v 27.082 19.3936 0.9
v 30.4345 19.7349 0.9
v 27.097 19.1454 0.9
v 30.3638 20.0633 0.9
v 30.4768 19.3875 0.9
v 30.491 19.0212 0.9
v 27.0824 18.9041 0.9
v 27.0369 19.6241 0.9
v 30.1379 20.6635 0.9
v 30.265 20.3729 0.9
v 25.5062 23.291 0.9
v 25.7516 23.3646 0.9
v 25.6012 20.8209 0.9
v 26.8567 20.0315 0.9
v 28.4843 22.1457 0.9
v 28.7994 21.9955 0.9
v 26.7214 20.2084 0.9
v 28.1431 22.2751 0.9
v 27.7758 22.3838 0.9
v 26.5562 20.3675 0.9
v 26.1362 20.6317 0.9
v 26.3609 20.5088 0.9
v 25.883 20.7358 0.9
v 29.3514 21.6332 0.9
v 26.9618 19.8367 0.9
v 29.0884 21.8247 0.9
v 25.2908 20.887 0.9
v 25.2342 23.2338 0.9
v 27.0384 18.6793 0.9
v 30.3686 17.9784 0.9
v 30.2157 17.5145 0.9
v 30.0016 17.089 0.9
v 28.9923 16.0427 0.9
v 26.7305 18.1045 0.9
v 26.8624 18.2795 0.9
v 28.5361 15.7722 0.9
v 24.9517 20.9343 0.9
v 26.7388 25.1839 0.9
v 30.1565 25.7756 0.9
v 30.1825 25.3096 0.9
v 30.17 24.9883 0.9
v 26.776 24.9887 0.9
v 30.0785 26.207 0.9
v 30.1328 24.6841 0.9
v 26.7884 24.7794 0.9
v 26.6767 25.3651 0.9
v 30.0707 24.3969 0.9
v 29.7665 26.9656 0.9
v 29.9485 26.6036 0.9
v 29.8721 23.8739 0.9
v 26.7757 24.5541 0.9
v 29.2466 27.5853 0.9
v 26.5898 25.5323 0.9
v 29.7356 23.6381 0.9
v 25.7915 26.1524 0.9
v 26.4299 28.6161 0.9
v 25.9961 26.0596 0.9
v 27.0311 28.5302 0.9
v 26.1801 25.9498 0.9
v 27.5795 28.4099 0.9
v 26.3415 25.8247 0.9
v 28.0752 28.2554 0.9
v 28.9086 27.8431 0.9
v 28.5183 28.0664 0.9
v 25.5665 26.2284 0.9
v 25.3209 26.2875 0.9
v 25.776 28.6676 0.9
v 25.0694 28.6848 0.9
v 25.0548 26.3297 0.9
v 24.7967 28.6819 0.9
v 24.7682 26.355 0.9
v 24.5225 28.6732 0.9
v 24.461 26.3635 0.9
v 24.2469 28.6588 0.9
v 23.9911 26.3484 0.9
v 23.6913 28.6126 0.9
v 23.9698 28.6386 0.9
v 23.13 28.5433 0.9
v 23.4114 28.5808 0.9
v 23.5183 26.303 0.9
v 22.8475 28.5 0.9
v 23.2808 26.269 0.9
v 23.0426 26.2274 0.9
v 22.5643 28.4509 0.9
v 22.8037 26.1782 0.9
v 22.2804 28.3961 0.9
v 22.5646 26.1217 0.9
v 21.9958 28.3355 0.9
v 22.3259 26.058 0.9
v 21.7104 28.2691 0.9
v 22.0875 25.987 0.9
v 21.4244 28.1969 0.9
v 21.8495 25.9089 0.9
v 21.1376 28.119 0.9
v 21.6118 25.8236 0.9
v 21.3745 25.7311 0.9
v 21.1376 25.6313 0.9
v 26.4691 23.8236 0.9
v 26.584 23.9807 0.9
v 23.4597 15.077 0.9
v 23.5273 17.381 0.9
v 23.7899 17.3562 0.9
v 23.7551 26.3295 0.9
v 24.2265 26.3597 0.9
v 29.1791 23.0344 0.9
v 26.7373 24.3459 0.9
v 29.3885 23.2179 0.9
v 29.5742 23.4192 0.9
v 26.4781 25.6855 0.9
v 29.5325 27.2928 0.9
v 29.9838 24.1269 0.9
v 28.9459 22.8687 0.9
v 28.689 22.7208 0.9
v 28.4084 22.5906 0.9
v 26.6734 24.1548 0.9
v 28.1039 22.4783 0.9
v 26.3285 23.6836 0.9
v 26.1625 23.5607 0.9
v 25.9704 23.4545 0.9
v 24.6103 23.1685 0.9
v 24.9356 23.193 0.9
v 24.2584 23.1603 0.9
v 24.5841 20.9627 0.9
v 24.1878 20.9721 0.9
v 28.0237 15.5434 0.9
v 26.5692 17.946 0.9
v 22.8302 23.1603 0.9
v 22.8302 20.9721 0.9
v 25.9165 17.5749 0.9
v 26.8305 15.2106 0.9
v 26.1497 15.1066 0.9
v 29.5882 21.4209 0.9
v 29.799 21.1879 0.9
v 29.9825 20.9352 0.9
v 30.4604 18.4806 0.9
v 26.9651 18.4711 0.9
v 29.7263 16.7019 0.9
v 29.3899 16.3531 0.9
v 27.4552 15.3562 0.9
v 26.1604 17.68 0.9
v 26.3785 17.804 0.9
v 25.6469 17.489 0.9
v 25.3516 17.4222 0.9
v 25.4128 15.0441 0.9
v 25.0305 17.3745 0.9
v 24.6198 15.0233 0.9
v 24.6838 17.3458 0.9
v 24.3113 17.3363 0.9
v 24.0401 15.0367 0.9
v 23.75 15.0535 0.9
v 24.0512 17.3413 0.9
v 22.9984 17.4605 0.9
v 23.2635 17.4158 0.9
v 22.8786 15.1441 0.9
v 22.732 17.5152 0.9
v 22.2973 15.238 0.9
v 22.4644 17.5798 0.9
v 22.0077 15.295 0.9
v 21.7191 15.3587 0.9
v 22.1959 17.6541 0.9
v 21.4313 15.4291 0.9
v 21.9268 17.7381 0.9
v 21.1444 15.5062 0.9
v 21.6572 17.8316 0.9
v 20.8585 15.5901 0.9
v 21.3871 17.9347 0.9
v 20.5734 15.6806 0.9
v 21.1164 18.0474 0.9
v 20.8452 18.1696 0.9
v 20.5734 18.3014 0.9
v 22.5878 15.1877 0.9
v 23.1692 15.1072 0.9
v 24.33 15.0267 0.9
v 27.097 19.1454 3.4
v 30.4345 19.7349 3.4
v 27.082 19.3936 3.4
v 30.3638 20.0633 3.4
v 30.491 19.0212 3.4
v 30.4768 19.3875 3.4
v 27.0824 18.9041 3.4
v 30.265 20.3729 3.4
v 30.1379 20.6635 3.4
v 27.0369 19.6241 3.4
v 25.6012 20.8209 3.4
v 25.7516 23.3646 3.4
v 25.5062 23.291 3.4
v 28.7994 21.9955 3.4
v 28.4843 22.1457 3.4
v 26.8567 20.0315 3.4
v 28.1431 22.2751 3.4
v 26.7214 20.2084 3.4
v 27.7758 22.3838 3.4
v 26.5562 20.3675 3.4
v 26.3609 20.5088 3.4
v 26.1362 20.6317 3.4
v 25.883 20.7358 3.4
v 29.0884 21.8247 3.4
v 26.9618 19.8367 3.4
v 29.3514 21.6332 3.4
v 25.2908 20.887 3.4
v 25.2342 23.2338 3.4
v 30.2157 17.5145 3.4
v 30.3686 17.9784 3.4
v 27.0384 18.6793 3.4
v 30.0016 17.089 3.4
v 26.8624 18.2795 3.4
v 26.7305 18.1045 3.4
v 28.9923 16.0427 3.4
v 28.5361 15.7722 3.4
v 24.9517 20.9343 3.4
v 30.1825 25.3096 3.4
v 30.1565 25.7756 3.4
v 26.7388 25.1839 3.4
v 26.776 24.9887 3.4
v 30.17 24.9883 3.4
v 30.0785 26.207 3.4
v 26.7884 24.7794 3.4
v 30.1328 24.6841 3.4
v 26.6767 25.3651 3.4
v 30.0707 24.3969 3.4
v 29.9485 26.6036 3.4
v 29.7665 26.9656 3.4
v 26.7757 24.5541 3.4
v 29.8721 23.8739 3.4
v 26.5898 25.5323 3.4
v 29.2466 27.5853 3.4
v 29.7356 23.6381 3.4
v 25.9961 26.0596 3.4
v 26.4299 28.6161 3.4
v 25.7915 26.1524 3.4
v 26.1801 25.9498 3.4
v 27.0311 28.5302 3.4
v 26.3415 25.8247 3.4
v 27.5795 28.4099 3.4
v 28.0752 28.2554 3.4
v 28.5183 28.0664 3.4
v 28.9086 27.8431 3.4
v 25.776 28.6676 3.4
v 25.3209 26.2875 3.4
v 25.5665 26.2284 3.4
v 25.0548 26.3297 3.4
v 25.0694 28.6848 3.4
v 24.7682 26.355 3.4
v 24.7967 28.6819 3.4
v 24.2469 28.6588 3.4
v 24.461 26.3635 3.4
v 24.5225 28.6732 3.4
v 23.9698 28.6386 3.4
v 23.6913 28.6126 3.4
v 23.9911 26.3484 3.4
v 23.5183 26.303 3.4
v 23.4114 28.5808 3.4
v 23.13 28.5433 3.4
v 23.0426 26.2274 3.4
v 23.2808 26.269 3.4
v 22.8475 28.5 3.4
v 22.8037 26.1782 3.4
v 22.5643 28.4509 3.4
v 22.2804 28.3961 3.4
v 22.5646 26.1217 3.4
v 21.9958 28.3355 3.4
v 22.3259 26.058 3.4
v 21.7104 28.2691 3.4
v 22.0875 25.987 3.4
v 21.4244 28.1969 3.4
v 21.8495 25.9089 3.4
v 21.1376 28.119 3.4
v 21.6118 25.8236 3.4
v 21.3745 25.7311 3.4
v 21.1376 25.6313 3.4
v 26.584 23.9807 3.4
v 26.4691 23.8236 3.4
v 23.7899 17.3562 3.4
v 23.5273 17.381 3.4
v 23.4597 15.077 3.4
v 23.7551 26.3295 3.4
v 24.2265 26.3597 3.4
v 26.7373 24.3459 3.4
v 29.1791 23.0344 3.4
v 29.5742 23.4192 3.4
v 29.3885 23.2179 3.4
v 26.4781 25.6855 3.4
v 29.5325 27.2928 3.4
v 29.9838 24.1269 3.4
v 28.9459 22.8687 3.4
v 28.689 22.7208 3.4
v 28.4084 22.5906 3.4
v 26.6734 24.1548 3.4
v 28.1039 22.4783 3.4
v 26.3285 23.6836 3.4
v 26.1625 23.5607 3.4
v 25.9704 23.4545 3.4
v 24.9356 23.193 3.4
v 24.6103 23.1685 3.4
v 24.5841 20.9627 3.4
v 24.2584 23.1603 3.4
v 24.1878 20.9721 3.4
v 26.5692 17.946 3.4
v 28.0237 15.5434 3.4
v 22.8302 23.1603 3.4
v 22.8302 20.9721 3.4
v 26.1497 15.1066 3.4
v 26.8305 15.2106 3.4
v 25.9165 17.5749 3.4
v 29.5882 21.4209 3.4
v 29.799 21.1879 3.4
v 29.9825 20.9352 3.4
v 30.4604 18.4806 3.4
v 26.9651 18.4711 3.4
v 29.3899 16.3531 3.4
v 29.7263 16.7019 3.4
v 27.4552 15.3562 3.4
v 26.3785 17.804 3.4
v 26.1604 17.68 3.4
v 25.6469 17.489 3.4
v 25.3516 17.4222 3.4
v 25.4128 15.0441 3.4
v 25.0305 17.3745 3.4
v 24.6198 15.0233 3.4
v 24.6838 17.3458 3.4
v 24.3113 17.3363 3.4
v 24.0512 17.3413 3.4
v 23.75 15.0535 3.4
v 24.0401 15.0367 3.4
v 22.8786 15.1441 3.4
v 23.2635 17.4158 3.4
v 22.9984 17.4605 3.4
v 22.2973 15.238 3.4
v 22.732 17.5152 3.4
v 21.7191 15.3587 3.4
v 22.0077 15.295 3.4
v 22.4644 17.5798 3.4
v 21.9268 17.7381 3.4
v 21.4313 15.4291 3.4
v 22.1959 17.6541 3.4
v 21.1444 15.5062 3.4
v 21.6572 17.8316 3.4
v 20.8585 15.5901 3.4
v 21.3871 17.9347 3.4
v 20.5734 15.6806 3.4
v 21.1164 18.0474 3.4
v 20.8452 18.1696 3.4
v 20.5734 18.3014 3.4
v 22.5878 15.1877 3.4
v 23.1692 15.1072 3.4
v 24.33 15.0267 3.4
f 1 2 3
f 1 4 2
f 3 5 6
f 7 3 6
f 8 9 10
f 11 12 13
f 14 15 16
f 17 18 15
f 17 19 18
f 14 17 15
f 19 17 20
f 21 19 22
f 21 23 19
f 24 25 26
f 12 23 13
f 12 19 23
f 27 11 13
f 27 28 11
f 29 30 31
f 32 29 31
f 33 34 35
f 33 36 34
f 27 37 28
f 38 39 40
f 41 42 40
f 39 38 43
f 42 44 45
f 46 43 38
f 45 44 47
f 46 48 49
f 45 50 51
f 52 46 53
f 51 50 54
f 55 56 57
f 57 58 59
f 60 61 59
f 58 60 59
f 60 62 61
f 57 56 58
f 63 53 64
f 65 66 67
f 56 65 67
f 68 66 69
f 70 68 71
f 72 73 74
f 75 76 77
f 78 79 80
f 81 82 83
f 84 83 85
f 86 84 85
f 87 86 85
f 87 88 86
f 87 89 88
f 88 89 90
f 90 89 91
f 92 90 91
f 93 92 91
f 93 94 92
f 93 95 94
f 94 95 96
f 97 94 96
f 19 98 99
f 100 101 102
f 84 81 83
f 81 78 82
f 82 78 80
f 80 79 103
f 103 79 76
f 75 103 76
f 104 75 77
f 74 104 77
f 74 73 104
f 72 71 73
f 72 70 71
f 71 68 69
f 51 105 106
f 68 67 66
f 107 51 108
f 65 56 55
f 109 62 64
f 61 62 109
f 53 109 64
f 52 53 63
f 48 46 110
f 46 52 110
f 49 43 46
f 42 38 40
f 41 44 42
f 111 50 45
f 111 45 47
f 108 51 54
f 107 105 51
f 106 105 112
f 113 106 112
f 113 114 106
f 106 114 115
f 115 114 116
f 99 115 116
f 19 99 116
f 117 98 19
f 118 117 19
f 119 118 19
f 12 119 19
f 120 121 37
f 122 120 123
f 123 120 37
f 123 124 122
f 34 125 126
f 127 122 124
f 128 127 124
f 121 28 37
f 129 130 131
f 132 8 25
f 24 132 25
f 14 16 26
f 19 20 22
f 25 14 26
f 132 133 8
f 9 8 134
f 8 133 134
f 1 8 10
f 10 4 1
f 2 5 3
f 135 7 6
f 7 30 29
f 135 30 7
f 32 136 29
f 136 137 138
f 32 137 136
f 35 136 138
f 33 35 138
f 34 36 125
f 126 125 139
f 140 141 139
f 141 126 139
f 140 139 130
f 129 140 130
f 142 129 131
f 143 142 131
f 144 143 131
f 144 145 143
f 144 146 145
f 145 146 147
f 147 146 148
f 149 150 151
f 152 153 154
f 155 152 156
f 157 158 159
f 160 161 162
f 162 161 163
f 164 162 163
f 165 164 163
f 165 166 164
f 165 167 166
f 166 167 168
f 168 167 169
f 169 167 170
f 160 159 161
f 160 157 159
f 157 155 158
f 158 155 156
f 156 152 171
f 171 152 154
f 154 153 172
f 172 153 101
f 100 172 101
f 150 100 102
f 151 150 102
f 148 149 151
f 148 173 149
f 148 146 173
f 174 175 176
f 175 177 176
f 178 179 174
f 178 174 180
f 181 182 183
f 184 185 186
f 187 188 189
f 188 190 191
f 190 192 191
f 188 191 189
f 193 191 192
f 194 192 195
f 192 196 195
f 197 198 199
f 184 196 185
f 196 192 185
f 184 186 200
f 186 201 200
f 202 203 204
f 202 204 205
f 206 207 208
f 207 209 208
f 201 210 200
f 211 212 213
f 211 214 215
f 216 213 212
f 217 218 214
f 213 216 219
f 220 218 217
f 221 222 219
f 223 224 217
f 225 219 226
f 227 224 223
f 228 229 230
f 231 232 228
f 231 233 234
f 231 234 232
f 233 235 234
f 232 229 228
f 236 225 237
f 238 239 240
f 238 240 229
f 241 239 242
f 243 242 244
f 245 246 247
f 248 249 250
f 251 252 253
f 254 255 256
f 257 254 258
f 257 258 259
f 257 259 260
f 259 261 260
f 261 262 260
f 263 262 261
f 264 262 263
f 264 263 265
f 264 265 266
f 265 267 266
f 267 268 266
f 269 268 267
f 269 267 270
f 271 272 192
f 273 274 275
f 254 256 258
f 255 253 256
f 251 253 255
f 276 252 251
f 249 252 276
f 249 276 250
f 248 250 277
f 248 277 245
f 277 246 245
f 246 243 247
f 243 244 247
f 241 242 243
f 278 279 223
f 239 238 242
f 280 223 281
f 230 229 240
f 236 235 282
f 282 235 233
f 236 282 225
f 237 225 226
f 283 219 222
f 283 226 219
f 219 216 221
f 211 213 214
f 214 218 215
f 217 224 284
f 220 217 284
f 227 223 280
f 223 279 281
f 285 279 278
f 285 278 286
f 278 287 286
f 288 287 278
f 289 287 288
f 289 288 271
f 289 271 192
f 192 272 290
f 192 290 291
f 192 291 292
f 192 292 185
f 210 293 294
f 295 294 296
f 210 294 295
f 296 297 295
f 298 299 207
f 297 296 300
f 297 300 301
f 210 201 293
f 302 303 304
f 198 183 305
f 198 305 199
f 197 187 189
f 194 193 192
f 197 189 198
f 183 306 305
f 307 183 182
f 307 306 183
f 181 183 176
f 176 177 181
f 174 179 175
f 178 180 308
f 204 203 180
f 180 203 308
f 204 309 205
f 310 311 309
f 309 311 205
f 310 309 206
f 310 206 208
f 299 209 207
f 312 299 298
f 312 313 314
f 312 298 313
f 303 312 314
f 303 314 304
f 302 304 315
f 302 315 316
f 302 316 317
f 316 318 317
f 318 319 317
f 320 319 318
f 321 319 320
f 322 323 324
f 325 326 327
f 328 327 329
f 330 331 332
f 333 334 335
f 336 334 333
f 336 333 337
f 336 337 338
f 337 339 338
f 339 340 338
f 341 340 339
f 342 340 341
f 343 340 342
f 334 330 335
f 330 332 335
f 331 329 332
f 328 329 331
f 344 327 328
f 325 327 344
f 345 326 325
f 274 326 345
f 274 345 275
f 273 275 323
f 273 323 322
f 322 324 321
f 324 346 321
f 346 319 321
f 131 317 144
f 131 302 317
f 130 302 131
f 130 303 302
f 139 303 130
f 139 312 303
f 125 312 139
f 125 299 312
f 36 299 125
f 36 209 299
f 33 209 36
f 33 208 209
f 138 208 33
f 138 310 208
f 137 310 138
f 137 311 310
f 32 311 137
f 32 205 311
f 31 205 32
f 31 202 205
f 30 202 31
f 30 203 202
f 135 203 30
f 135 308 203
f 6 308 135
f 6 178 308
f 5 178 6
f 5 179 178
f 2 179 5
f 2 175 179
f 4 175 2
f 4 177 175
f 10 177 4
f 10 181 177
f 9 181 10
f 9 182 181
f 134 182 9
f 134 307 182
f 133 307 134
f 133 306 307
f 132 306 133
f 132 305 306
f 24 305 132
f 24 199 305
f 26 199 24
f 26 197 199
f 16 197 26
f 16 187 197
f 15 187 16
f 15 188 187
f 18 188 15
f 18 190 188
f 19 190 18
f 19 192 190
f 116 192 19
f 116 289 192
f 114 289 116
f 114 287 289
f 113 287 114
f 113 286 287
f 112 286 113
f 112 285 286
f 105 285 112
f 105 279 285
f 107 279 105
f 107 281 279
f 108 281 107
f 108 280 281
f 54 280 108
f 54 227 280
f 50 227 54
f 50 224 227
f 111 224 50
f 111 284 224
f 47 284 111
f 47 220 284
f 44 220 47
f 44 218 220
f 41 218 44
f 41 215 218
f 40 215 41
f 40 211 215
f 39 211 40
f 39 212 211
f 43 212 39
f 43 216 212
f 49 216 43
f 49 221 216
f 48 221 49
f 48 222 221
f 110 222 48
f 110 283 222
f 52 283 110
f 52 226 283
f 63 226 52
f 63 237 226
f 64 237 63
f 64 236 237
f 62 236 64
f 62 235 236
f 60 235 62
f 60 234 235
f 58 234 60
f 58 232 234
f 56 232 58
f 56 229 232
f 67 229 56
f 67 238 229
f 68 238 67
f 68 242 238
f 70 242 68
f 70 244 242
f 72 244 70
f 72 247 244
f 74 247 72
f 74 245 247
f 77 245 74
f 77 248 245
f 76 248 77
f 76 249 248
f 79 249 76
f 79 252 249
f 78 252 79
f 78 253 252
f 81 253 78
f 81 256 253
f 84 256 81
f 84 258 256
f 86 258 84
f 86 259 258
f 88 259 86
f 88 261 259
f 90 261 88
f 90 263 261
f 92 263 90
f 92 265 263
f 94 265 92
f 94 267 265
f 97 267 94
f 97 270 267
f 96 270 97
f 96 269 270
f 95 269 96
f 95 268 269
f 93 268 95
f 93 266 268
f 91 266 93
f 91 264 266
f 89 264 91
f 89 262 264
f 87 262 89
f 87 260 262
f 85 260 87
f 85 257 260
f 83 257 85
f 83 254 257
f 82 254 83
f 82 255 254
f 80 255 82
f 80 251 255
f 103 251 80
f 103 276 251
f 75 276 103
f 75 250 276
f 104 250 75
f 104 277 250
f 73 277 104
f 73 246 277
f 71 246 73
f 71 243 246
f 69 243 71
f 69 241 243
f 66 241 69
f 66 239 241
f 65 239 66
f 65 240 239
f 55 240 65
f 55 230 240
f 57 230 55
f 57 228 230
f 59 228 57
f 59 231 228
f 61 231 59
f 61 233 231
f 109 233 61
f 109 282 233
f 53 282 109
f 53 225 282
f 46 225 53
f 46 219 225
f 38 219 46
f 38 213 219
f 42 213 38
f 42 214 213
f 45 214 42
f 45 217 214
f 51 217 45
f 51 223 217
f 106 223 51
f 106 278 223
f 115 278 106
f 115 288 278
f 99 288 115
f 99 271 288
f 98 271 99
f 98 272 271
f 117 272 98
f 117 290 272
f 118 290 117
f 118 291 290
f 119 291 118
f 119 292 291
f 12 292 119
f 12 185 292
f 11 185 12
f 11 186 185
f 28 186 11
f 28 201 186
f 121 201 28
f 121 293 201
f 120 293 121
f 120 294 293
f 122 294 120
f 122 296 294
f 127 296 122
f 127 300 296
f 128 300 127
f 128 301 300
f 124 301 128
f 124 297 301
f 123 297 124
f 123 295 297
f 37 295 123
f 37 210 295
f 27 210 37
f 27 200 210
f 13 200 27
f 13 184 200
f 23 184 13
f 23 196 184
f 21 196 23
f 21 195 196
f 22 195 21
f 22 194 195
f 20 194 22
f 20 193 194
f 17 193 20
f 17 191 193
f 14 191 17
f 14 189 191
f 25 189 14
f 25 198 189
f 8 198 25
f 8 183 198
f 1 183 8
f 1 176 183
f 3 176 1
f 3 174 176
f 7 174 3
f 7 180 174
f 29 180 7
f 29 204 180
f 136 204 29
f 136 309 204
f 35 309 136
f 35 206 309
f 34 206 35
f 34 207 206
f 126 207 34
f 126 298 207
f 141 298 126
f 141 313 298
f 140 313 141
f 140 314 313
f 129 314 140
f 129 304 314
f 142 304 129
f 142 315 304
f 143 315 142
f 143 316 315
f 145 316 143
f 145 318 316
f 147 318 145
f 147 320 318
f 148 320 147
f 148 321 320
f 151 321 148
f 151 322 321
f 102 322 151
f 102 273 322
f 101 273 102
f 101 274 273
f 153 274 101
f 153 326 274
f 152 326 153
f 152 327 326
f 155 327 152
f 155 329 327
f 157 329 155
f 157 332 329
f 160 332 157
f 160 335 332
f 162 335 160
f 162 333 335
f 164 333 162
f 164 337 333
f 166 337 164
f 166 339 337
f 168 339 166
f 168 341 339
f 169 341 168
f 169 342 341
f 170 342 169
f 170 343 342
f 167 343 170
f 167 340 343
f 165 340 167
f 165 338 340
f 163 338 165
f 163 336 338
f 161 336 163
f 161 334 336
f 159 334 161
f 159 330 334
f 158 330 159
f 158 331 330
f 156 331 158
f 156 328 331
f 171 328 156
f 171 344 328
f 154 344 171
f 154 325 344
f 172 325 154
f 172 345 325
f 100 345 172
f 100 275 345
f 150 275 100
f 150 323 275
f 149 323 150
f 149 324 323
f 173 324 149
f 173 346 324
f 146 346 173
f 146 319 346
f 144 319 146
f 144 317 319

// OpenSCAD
$fn = 48;
  translate([25.500, 21.700, 0.900])
    linear_extrude(height=2.500)
      text("3", size=13.000, halign="center", valign="center", font="Helvetica Neue:style=Bold");
